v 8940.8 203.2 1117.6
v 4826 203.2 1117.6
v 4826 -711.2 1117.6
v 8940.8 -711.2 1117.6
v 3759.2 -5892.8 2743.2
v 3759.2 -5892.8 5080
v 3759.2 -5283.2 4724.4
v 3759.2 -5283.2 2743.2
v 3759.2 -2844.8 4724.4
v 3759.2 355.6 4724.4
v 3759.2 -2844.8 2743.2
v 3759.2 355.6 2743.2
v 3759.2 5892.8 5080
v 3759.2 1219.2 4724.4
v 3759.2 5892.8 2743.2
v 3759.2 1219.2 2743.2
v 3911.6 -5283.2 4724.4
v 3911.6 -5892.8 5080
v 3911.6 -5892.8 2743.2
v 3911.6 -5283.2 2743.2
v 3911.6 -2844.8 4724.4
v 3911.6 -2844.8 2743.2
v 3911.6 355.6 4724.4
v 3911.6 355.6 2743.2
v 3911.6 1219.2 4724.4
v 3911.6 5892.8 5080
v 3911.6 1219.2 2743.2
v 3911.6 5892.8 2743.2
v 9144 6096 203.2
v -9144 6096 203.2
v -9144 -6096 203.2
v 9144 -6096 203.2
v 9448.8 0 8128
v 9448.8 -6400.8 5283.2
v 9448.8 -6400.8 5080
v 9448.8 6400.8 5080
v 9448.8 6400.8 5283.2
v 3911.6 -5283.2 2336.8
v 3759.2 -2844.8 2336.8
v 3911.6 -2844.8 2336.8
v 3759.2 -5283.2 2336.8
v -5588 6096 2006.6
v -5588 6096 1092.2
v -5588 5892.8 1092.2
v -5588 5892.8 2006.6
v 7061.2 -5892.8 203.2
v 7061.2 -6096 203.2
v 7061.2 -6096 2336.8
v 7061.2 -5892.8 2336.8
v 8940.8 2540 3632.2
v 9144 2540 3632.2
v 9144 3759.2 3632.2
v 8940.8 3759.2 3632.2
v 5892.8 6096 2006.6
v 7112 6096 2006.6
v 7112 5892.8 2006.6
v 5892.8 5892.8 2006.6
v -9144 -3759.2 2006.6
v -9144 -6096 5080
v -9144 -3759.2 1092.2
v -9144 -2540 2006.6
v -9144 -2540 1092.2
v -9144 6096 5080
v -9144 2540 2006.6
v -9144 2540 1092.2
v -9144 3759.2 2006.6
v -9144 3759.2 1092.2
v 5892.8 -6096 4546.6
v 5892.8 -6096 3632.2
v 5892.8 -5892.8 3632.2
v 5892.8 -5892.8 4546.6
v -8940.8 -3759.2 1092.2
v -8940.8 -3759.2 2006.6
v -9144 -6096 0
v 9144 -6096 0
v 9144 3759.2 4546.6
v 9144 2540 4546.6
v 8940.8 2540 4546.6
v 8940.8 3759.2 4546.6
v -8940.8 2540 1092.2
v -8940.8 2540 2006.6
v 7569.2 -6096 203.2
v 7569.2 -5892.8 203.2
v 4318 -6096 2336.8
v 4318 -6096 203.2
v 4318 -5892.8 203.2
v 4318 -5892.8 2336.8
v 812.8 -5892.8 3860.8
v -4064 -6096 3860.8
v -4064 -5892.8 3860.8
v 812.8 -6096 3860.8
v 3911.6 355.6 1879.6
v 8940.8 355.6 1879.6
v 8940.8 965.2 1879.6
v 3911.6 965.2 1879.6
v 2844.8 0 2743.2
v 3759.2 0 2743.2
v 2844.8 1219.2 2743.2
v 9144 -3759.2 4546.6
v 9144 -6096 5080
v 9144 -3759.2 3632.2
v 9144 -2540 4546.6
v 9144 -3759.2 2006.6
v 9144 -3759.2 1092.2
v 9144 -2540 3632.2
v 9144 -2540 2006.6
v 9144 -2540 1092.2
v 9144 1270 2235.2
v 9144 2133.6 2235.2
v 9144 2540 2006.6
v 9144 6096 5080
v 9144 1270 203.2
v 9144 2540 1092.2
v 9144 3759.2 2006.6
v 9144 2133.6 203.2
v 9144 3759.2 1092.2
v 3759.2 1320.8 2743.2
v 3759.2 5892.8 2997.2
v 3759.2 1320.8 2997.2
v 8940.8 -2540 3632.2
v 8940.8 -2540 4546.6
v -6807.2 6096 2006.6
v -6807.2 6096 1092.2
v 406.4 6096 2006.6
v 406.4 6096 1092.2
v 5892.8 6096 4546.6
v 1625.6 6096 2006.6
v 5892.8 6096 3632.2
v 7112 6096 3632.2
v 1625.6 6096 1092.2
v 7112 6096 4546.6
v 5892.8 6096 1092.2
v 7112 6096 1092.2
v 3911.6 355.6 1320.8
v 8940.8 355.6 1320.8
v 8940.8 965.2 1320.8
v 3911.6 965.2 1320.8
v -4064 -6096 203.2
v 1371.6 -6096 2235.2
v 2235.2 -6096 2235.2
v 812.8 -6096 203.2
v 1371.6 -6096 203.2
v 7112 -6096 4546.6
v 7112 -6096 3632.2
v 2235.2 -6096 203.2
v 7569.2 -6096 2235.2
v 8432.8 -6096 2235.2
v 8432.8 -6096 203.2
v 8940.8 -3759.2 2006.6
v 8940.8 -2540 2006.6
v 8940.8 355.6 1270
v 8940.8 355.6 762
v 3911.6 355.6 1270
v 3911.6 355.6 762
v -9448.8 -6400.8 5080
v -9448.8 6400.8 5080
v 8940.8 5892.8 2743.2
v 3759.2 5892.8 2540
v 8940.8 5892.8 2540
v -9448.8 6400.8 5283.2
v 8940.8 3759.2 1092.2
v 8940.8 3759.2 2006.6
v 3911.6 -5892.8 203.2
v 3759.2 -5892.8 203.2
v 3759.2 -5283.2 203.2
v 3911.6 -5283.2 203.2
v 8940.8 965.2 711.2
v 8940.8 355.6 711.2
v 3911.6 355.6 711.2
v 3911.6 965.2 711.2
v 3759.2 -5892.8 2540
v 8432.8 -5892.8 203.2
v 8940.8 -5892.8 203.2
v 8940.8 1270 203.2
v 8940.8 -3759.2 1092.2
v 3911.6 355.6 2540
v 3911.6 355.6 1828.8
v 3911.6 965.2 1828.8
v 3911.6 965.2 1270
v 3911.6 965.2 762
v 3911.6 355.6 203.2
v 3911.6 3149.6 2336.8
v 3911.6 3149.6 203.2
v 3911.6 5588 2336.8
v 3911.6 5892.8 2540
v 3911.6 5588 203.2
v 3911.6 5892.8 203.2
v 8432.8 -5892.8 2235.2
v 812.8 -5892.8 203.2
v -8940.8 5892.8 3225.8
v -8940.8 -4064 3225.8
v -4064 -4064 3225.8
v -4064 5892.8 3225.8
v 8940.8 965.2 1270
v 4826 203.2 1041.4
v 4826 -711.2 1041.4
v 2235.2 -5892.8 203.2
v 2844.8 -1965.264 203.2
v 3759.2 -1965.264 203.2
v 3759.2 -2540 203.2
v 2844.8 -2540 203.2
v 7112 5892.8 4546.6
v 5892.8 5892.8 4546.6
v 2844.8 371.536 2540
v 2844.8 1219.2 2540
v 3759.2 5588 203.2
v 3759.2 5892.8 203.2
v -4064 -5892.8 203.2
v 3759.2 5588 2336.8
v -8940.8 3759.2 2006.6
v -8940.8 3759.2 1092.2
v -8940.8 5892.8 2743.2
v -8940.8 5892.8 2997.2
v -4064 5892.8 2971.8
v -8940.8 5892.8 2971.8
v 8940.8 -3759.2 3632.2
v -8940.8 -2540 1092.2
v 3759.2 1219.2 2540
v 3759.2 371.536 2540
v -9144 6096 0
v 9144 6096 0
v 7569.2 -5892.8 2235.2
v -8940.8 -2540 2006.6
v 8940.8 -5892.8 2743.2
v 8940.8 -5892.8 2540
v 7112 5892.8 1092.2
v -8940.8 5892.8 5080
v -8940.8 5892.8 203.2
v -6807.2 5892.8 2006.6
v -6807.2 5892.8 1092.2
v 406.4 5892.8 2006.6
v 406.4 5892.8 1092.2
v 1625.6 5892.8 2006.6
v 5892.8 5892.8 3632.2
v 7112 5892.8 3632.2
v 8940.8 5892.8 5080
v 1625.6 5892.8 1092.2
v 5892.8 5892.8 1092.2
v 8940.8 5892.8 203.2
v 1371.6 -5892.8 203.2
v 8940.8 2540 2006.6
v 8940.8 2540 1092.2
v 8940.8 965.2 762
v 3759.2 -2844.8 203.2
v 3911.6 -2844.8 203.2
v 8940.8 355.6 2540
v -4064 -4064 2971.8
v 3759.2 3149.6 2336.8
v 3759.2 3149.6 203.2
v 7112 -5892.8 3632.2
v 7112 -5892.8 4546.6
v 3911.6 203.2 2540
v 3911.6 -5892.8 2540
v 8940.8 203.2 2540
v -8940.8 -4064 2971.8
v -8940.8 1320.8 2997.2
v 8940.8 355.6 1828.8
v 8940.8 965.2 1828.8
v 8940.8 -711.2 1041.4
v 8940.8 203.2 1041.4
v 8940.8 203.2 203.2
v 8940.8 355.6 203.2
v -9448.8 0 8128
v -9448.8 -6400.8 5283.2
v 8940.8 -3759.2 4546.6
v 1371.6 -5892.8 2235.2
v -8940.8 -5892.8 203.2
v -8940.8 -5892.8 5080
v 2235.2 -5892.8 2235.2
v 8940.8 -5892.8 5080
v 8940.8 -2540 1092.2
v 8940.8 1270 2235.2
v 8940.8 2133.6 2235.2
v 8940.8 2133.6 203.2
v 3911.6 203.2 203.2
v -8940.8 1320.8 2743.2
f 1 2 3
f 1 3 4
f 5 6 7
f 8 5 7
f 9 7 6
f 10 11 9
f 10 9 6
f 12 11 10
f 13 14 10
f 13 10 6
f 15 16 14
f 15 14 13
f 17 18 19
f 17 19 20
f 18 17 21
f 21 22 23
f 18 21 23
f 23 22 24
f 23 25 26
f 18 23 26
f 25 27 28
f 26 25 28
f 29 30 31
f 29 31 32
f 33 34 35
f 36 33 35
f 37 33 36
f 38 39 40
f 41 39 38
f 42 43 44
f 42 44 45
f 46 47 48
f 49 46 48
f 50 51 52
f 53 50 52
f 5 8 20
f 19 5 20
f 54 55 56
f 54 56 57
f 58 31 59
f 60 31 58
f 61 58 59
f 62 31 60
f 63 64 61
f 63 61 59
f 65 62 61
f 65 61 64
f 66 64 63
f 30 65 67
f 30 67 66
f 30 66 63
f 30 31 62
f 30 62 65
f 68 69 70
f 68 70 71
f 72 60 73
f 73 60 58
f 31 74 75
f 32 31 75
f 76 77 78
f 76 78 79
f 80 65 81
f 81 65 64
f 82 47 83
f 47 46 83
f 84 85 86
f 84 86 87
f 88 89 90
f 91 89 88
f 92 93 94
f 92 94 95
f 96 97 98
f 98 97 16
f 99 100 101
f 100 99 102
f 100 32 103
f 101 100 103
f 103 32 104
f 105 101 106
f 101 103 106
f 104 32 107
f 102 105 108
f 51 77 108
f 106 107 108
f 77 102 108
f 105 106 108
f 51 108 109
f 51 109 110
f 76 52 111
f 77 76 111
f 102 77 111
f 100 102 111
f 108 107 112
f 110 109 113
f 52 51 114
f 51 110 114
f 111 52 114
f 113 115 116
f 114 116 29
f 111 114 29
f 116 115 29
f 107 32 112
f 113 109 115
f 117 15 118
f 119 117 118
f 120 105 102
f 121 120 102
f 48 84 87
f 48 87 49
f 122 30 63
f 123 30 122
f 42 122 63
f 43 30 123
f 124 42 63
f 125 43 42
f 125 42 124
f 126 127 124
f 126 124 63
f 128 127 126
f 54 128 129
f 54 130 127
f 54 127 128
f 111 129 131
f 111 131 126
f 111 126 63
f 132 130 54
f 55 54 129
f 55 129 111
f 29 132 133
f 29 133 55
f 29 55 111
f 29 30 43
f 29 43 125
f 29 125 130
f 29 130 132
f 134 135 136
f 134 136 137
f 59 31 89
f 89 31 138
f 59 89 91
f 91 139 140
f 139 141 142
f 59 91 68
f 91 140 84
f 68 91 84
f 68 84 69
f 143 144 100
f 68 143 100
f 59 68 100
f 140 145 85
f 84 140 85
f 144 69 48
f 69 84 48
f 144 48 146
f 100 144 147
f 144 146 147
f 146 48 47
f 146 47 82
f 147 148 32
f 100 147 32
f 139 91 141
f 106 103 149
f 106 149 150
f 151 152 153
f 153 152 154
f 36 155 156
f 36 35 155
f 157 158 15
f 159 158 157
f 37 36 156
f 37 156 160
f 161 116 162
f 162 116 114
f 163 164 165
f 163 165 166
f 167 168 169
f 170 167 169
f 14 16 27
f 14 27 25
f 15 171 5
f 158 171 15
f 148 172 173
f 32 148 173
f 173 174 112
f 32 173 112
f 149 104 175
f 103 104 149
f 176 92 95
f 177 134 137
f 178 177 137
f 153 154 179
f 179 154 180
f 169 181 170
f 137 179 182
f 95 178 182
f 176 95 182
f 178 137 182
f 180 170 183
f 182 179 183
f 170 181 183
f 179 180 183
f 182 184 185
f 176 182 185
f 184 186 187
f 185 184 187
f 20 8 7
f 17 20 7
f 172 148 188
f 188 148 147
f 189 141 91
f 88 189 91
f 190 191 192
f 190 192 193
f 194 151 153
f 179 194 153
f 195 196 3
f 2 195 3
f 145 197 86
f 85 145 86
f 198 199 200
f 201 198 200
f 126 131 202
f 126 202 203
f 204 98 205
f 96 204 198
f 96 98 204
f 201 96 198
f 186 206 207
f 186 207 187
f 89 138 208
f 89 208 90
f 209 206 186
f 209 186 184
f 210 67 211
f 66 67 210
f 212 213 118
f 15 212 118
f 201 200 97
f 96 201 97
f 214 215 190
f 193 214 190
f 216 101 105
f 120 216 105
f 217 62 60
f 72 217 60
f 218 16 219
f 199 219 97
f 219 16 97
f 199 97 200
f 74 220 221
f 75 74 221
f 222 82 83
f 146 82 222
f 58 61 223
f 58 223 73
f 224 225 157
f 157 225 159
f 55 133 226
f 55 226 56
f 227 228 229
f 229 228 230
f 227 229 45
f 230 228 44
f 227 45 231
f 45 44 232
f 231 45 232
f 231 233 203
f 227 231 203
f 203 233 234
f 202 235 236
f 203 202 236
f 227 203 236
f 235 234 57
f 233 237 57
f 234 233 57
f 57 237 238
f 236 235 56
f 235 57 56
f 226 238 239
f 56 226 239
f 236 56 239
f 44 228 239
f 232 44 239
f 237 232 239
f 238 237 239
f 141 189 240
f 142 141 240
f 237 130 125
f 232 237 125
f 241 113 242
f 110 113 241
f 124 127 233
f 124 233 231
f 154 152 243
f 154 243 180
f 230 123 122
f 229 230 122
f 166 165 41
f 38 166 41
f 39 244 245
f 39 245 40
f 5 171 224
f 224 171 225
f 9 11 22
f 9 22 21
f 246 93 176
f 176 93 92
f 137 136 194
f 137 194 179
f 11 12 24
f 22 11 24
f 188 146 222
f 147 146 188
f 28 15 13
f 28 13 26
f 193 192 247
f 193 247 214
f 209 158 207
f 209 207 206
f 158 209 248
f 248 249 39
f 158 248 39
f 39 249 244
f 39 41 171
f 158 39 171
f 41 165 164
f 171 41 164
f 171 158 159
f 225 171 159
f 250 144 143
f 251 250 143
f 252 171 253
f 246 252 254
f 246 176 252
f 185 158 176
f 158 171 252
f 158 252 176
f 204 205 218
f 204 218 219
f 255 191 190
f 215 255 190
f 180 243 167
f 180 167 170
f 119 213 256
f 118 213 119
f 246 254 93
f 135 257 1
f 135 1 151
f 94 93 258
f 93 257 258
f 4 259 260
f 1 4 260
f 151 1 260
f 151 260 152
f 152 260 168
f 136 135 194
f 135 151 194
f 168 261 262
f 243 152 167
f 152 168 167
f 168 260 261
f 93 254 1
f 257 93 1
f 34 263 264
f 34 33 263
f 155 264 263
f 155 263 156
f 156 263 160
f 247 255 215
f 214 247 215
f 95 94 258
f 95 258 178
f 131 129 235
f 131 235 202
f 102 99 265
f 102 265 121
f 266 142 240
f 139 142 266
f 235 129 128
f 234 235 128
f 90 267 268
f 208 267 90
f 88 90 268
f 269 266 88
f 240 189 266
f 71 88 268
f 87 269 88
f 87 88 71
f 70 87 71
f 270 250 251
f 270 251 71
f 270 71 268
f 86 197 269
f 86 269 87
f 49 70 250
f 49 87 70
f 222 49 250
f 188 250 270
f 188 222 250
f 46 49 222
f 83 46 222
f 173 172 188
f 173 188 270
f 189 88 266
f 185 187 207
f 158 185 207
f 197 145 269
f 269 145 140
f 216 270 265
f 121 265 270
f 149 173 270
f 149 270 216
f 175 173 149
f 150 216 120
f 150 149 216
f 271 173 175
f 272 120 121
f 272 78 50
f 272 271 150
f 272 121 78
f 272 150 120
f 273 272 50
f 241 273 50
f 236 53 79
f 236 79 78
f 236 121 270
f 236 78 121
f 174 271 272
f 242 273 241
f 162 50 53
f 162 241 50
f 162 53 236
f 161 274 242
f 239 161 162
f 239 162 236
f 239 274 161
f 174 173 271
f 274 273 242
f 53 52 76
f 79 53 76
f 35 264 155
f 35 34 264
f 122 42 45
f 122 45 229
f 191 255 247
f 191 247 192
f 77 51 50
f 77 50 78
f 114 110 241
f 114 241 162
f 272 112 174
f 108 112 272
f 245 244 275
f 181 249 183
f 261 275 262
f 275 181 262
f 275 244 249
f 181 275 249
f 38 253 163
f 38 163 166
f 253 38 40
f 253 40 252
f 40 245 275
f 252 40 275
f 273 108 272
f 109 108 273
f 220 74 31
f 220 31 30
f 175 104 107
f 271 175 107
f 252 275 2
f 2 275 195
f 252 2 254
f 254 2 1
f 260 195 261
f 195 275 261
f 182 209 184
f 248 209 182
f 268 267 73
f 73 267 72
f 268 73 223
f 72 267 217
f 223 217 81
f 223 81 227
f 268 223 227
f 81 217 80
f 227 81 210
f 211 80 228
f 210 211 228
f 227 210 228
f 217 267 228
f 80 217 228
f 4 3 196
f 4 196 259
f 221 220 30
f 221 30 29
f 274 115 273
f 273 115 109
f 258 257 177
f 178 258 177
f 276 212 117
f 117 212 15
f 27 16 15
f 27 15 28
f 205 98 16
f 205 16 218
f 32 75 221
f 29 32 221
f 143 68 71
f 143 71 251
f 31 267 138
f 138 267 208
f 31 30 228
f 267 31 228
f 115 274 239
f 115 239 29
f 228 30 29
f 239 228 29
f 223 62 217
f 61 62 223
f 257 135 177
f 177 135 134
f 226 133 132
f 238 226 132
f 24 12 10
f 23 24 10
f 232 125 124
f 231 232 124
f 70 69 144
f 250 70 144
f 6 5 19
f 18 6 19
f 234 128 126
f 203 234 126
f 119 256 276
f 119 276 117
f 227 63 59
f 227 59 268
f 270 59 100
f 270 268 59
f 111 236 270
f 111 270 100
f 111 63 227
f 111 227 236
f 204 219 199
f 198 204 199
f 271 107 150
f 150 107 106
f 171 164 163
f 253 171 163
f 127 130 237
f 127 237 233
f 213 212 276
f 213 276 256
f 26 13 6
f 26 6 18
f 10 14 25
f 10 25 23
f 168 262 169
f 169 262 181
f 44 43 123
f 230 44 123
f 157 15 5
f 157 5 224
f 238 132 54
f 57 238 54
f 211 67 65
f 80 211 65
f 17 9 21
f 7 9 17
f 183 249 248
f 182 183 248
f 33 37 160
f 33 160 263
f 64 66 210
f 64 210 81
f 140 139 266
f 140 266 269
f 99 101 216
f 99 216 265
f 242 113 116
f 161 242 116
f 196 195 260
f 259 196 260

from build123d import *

# Parameters (mm, degrees)
F0_W          = 18288
F0_H          = 12192
F1_DEPTH      = 203.2
F2_W          = 18288
F2_H          = 12192
F2_W_2        = 17881.6
F2_H_2        = 11785.6
F3_DEPTH      = 4876.8
F5_DEPTH      = 9448.8
F5_DEPTH_BACK = 9448.8
F7_DEPTH      = 2336.8
F8_W          = 5181.6
F8_H          = 11785.6
F9_DEPTH      = 203.2
F10_W         = 4876.8
F10_H         = 3657.6
F10_W_2       = 863.6
F10_H_2       = 2032
F10_W_3       = 2743.2
F10_H_3       = 2133.6
F10_W_4       = 1219.2
F10_H_4       = 914.4
F11_DEPTH     = 203.2
F12_W         = 863.6
F12_H         = 2032
F13_DEPTH     = 203.2
F15_DEPTH     = 914.4
F16_W         = 2438.4
F16_H         = 2133.6
F17_DEPTH     = 152.4
F18_W         = 152.4
F18_H         = 11785.6
F19_DEPTH     = 2336.8
F20_W         = 863.6
F20_H         = 1981.2
F20_W_2       = 2438.4
F21_DEPTH     = 152.4
F22_W         = 12700
F22_H         = 254
F23_DEPTH     = 4572
F24_W         = 9956.8
F24_H         = 254
F25_DEPTH     = 4876.8
F26_W         = 5029.2
F26_H         = 50.8
F27_DEPTH     = 609.6
F28_W         = 4114.8
F28_H         = 76.2
F29_DEPTH     = 914.4
F30_W         = 1219.2
F30_H         = 914.4
F31_DEPTH     = 203.2
F32_W         = 1219.2
F32_H         = 914.4
F33_DEPTH     = 203.2
F34_W         = 1219.2
F34_H         = 914.4
F35_DEPTH     = 203.2


with BuildPart() as f1:
    # F0 (on Top) → F1 (new body)
    with BuildSketch(Plane.XY):
        Rectangle(F0_W, F0_H)
    extrude(amount=F1_DEPTH)


with BuildPart() as f3:
    # F2 (on face) → F3 (new body)
    with BuildSketch(Plane.XY.offset(203.2)):
        Rectangle(F2_W, F2_H)
        Rectangle(F2_W_2, F2_H_2, mode=Mode.SUBTRACT)
    extrude(amount=F3_DEPTH)

    # F10 (on face) → F11 (cut, through all)
    with BuildSketch(Plane.XZ.offset(6096)):
        with Locations((-1625.6, 2032)):
            Rectangle(F10_W, F10_H)
        with Locations((1803.4, 1219.2)):
            Rectangle(F10_W_2, F10_H_2)
        with Locations((5689.6, 1270)):
            Rectangle(F10_W_3, F10_H_3)
        with Locations((8001, 1219.2)):
            Rectangle(F10_W_2, F10_H_2)
        with Locations((6502.4, 4089.4)):
            Rectangle(F10_W_4, F10_H_4)
    extrude(amount=-F11_DEPTH, mode=Mode.SUBTRACT)

    # F12 (on face) → F13 (cut, through all)
    with BuildSketch(Plane.YZ.offset(9144)):
        with Locations((1701.8, 1219.2)):
            Rectangle(F12_W, F12_H)
    extrude(amount=-F13_DEPTH, mode=Mode.SUBTRACT)

    # F30 (on face) → F31 (cut, through all)
    with BuildSketch(Plane(origin=(0, 6096, 0), x_dir=(-1, 0, 0), z_dir=(0, 1, 0))):
        with Locations((-6502.4, 4089.4)):
            Rectangle(F30_W, F30_H)
        with Locations((-6502.4, 1549.4)):
            Rectangle(F30_W, F30_H)
        with Locations((-1016, 1549.4)):
            Rectangle(F30_W, F30_H)
        with Locations((6197.6, 1549.4)):
            Rectangle(F30_W, F30_H)
    extrude(amount=-F31_DEPTH, mode=Mode.SUBTRACT)

    # F32 (on face) → F33 (cut, through all)
    with BuildSketch(Plane(origin=(-9144, 0, 0), x_dir=(0, -1, 0), z_dir=(-1, 0, 0))):
        with Locations((-3149.6, 1549.4)):
            Rectangle(F32_W, F32_H)
        with Locations((3149.6, 1549.4)):
            Rectangle(F32_W, F32_H)
    extrude(amount=-F33_DEPTH, mode=Mode.SUBTRACT)

    # F34 (on face) → F35 (cut, through all)
    with BuildSketch(Plane.YZ.offset(9144)):
        with Locations((-3149.6, 1549.4)):
            Rectangle(F34_W, F34_H)
        with Locations((3149.6, 1549.4)):
            Rectangle(F34_W, F34_H)
        with Locations((-3149.6, 4089.4)):
            Rectangle(F34_W, F34_H)
        with Locations((3149.6, 4089.4)):
            Rectangle(F34_W, F34_H)
    extrude(amount=-F35_DEPTH, mode=Mode.SUBTRACT)


with BuildPart() as f5:
    # F4 (on Right) → F5 (new body, two sides)
    with BuildSketch(Plane.YZ) as f5_sk:
        Polygon((-6400.8, 5080), (6400.8, 5080), (6400.8, 5283.2), (0, 8128), (-6400.8, 5283.2), align=None)
    extrude(amount=F5_DEPTH)
    extrude(f5_sk.sketch, amount=-F5_DEPTH_BACK)


with BuildPart() as f7:
    # F6 (on face) → F7 (new body)
    with BuildSketch(Plane.XY.offset(203.2)):
        Polygon((3759.2, 5892.8), (3759.2, -5892.8), (3911.6, -5892.8), (3911.6, 203.2), (8940.8, 203.2), (8940.8, 355.6), (3911.6, 355.6), (3911.6, 5892.8), align=None)
    extrude(amount=F7_DEPTH)

    # F16 (on face) → F17 (cut, through all)
    with BuildSketch(Plane(origin=(3759.2, 0, 0), x_dir=(0, -1, 0), z_dir=(-1, 0, 0))):
        with Locations((-4368.8, 1270)):
            Rectangle(F16_W, F16_H)
        with Locations((4064, 1270)):
            Rectangle(F16_W, F16_H)
    extrude(amount=-F17_DEPTH, mode=Mode.SUBTRACT)

    # F26 (on face) → F27 (join)
    with BuildSketch(Plane(origin=(0, 355.6, 0), x_dir=(-1, 0, 0), z_dir=(0, 1, 0))):
        with Locations((-6426.2, 1854.2)):
            Rectangle(F26_W, F26_H)
        with Locations((-6426.2, 1295.4)):
            Rectangle(F26_W, F26_H)
        with Locations((-6426.2, 736.6)):
            Rectangle(F26_W, F26_H)
    extrude(amount=F27_DEPTH)

    # F28 (on face) → F29 (join)
    with BuildSketch(Plane.XZ.offset(-203.2)):
        with Locations((6883.4, 1079.5)):
            Rectangle(F28_W, F28_H)
    extrude(amount=F29_DEPTH)


with BuildPart() as f9:
    # F8 (on face) → F9 (new body)
    with BuildSketch(Plane.XY.offset(2540)):
        with Locations((6350, 0)):
            Rectangle(F8_W, F8_H)
    extrude(amount=F9_DEPTH)


with BuildPart() as f15:
    # F14 (on face) → F15 (new body)
    with BuildSketch(Plane(origin=(3759.2, 0, 0), x_dir=(0, -1, 0), z_dir=(-1, 0, 0))):
        Polygon((-371.5363917484, 2540), (1965.2636082516, 203.2), (2540, 203.2), (0, 2743.2), (-574.7363917484, 2743.2), (-1219.2, 2743.2), (-1219.2, 2540), align=None)
    extrude(amount=F15_DEPTH)


with BuildPart() as f19:
    # F18 (on face) → F19 (new body, through all)
    with BuildSketch(Plane.XY.offset(2743.2)):
        with Locations((3835.4, 0)):
            Rectangle(F18_W, F18_H)
    extrude(amount=F19_DEPTH)

    # F20 (on face) → F21 (cut, through all)
    with BuildSketch(Plane(origin=(3759.2, 0, 0), x_dir=(0, -1, 0), z_dir=(-1, 0, 0))):
        with Locations((-787.4, 3733.8)):
            Rectangle(F20_W, F20_H)
        with Locations((4064, 3733.8)):
            Rectangle(F20_W_2, F20_H)
    extrude(amount=-F21_DEPTH, mode=Mode.SUBTRACT)


with BuildPart() as f23:
    # F22 (on face) → F23 (new body)
    with BuildSketch(Plane.XZ.offset(-5892.8)):
        with Locations((-2590.8, 2870.2)):
            Rectangle(F22_W, F22_H)
    extrude(amount=F23_DEPTH)


with BuildPart() as f25:
    # F24 (on face) → F25 (new body)
    with BuildSketch(Plane.YZ.offset(-8940.8)):
        with Locations((914.4, 3098.8)):
            Rectangle(F24_W, F24_H)
    extrude(amount=F25_DEPTH)


solid = Compound([f1.part, f3.part, f5.part, f7.part, f9.part, f15.part, f19.part, f23.part, f25.part])
